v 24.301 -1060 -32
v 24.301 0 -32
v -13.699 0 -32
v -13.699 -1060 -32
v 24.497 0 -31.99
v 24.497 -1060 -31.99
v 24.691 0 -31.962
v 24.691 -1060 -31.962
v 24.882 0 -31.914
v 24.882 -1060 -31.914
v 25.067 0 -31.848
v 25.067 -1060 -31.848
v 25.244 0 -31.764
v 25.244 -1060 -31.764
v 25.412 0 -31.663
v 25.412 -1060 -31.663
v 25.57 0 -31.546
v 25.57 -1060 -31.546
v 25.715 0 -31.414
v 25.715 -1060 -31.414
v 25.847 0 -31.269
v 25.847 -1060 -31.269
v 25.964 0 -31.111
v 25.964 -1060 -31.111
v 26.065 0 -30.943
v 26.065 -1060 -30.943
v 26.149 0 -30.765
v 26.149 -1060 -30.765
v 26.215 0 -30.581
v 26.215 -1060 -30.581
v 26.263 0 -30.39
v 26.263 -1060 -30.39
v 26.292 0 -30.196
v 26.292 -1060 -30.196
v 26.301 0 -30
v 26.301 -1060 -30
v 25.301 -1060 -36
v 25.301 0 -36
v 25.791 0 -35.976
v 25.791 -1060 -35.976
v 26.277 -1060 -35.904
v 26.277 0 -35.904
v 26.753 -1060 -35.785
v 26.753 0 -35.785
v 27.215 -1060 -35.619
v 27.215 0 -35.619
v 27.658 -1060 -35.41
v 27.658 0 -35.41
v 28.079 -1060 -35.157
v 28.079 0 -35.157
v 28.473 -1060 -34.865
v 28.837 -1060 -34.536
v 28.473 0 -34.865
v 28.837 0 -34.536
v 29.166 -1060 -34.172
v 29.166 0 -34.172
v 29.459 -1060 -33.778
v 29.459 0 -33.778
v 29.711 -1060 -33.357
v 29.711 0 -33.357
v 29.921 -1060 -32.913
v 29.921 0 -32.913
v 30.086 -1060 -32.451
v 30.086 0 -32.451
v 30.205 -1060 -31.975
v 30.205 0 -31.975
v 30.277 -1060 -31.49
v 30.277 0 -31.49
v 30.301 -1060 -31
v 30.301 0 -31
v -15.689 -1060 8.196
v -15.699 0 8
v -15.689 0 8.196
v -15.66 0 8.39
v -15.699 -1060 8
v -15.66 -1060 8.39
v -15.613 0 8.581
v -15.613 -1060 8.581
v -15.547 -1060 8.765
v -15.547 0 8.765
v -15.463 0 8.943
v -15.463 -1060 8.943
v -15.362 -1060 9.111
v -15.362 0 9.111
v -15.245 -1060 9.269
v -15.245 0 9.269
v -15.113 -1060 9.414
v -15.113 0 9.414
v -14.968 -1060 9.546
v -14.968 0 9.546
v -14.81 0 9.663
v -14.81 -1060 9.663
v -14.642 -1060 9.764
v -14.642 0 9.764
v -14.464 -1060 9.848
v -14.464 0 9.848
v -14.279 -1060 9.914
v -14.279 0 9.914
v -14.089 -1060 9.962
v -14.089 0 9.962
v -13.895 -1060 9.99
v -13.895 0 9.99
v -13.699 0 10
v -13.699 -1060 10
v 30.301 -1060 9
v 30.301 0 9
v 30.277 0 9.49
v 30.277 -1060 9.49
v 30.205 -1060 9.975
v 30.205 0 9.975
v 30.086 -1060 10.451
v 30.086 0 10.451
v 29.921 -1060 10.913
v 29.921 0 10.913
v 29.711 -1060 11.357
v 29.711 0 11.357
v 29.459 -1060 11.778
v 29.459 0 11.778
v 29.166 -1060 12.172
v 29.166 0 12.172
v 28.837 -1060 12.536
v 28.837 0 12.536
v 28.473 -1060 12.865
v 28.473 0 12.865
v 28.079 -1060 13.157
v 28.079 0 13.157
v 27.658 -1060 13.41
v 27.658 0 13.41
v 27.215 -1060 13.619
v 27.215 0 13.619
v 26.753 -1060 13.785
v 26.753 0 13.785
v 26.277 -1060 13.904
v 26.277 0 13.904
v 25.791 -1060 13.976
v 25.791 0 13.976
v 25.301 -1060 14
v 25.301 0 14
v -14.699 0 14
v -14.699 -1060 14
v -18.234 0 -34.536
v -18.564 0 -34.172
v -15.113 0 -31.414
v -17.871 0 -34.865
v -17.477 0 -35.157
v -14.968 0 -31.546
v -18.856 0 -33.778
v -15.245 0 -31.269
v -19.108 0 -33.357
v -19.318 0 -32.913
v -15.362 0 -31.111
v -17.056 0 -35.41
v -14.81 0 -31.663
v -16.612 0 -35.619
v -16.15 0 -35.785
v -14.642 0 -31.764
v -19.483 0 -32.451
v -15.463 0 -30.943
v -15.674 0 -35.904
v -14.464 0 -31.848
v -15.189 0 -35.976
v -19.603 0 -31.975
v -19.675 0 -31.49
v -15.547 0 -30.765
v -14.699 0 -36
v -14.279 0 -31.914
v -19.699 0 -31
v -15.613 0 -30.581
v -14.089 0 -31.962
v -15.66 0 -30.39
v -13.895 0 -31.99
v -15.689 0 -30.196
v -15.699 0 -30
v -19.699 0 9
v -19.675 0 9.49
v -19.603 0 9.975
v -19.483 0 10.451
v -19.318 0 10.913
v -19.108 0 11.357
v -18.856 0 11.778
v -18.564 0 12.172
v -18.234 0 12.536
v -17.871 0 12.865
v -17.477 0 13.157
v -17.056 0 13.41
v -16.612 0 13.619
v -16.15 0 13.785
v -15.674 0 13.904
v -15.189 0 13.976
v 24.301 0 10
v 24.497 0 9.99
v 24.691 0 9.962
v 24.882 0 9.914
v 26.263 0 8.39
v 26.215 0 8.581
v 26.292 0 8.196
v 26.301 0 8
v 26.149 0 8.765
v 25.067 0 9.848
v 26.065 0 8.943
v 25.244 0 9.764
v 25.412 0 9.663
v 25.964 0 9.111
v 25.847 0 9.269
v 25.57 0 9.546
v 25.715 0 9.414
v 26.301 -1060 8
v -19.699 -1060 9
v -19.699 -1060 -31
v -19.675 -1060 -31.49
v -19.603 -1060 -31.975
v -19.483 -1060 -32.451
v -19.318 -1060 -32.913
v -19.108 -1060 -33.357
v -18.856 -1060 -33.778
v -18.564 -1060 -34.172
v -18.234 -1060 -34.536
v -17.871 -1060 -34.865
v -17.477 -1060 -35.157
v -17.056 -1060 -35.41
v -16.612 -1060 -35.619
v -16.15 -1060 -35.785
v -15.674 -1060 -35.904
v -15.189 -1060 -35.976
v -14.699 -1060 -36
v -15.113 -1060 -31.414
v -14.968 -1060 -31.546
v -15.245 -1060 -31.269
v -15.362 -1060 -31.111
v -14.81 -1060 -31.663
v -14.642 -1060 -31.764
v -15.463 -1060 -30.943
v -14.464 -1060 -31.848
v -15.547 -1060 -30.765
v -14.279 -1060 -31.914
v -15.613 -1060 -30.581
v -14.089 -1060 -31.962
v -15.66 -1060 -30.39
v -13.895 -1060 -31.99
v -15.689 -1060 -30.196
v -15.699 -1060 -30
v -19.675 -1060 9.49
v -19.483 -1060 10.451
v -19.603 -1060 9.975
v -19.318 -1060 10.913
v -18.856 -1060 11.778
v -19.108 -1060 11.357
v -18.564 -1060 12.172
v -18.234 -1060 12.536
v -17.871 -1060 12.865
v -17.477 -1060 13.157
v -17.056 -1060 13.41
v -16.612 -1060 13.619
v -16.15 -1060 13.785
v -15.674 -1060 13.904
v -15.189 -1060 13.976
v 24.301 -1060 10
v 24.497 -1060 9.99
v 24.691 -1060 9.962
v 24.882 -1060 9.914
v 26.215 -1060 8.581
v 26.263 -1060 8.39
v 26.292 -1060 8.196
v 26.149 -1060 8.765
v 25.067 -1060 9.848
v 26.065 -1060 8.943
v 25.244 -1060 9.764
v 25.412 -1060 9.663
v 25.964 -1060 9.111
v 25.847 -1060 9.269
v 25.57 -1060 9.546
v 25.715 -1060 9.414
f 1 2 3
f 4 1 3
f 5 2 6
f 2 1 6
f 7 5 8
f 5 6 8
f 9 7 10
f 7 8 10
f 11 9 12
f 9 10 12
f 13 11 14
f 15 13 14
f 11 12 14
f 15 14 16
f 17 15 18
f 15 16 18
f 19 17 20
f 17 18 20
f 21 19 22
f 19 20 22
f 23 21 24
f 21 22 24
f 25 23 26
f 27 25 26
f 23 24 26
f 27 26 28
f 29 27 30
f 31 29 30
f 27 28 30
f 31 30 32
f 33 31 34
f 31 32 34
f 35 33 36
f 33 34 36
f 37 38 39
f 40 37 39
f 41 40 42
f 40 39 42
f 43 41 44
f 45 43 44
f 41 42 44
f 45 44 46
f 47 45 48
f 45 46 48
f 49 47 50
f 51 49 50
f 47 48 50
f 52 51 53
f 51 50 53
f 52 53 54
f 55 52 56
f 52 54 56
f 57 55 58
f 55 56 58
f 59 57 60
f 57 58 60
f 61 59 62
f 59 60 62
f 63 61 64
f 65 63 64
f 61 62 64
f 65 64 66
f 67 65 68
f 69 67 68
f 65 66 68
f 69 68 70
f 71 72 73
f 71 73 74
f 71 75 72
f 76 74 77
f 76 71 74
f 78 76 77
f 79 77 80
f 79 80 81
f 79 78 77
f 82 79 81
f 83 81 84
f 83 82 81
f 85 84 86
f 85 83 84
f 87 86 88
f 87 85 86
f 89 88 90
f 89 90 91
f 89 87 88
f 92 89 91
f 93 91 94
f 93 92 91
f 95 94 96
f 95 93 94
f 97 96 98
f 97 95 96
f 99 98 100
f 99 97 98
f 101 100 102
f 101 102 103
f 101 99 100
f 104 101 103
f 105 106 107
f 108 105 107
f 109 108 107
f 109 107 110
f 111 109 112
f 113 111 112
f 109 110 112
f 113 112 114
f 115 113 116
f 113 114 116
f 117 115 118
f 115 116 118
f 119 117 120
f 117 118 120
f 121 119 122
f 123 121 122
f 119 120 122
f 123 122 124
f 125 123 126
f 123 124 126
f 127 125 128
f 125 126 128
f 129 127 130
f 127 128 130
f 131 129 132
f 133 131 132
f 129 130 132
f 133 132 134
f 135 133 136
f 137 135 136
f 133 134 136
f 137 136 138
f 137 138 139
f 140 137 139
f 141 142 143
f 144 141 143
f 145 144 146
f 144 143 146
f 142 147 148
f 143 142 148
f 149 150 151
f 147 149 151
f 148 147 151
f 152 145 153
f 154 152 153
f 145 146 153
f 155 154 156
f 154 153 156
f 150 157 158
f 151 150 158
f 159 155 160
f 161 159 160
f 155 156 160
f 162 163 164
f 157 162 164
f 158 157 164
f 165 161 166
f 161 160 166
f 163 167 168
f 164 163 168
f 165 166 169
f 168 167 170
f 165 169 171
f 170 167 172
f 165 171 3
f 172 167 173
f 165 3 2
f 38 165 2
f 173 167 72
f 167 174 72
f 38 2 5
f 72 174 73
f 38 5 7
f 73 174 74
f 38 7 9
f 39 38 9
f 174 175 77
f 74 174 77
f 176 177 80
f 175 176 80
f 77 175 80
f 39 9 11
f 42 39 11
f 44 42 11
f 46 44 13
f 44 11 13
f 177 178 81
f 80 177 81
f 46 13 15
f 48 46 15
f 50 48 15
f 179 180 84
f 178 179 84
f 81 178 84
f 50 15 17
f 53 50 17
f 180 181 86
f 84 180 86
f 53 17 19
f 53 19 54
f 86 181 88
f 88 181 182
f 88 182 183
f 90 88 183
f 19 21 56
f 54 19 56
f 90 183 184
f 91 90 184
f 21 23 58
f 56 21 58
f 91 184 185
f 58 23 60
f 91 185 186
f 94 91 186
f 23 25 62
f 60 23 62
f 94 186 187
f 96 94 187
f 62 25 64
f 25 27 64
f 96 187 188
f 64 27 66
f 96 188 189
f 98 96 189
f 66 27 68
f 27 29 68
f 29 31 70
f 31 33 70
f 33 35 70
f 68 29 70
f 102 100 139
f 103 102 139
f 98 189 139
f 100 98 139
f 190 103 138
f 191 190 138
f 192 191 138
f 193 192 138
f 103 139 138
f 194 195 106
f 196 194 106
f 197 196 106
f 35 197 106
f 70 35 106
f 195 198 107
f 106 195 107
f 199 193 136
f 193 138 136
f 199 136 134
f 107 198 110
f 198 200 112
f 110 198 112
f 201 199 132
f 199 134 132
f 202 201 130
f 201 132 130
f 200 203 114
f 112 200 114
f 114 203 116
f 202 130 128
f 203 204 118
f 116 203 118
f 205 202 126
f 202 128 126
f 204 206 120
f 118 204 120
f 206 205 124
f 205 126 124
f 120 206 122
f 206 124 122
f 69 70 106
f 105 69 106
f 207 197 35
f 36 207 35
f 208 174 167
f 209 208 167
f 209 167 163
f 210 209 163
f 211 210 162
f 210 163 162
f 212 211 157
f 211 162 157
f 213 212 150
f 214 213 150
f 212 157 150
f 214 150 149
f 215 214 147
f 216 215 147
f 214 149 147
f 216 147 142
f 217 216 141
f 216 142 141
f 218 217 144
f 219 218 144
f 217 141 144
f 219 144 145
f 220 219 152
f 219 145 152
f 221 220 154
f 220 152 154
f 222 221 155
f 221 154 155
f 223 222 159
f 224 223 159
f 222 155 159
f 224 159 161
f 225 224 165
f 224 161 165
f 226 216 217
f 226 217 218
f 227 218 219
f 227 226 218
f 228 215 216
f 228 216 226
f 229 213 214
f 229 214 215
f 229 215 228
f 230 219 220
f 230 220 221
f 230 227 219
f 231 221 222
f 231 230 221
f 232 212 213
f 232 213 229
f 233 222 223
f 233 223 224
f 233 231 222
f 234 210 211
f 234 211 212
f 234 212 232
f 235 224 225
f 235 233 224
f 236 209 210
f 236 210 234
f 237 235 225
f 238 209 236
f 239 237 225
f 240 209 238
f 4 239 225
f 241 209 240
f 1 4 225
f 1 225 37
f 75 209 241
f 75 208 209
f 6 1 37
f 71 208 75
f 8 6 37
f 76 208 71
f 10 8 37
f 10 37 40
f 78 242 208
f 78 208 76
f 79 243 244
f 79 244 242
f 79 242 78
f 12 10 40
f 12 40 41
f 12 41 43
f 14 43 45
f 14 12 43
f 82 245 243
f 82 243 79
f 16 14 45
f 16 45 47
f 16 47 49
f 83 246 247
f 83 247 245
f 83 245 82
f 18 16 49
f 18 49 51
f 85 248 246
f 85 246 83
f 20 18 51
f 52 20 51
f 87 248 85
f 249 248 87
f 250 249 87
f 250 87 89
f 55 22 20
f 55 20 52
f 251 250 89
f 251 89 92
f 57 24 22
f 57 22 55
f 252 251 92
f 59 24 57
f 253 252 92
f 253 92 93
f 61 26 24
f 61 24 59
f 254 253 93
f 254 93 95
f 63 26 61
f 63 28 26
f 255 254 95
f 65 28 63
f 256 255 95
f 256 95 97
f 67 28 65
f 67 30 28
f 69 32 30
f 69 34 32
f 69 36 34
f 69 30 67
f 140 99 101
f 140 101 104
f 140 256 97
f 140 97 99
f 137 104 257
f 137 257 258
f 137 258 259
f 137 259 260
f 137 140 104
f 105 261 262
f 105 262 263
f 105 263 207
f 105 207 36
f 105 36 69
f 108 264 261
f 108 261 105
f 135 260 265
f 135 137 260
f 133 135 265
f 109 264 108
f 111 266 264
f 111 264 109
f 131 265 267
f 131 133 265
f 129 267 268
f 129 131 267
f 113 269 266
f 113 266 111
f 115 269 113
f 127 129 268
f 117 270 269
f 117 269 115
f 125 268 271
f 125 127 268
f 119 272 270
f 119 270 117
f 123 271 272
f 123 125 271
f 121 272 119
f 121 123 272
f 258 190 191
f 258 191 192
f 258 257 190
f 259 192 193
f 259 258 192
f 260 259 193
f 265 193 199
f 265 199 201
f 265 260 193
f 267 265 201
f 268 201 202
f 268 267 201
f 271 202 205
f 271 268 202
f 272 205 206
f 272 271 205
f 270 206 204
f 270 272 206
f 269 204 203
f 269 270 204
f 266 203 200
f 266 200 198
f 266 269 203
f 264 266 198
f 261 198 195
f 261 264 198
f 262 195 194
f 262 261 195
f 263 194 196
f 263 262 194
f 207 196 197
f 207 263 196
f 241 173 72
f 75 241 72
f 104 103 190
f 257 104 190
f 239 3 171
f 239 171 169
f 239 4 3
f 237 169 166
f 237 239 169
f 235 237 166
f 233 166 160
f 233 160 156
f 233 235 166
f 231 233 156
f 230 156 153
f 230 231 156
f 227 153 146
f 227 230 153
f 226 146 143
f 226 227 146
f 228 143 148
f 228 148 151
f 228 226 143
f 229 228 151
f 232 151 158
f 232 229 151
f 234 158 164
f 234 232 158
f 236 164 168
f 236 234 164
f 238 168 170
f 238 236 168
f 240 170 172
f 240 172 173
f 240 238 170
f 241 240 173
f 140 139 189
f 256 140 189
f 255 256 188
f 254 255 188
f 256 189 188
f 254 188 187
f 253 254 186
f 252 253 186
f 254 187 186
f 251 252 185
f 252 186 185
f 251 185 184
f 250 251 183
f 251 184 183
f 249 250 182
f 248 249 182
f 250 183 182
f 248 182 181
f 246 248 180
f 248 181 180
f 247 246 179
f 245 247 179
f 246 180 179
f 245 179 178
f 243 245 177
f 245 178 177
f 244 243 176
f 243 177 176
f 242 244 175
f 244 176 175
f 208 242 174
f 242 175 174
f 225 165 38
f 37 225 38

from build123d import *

# Parameters (mm, degrees)
F1_DEPTH = 1060
F2_R     = 2


with BuildPart() as f1:
    # F0 (on Front) → F1 (new body)
    with BuildSketch(Plane.XZ):
        with BuildLine():
            Line((5.301232, 14.000001), (-14.698768, 14.000001))
            ThreePointArc((-14.698768, 14.000001), (-18.234301, 12.535535), (-19.698768, 9.000001))
            Line((-19.698768, 9.000001), (-19.698768, -30.999999))
            ThreePointArc((-19.698768, -30.999999), (-18.234301, -34.535533), (-14.698768, -35.999999))
            Line((-14.698768, -35.999999), (5.301232, -35.999999))
            Line((5.301232, -35.999999), (25.301232, -35.999999))
            ThreePointArc((25.301232, -35.999999), (28.836766, -34.535533), (30.301232, -30.999999))
            Line((30.301232, -30.999999), (30.301232, 9.000001))
            ThreePointArc((30.301232, 9.000001), (28.836766, 12.535535), (25.301232, 14.000001))
            Line((25.301232, 14.000001), (5.301232, 14.000001))
        make_face()
        Polygon((-15.698768, -31.999999), (-15.698768, 10.000001), (5.301232, 10.000001), (26.301232, 10.000001), (26.301232, -31.999999), (5.301232, -31.999999), align=None, mode=Mode.SUBTRACT)
    extrude(amount=F1_DEPTH)

    # F2
    f2_edges = [f1.edges().sort_by_distance(p)[0] for p in [
        (-15.698768, -530, 10.000001),
        (26.301232, -530, 10.000001),
        (26.301232, -530, -31.999999),
        (-15.698768, -530, -31.999999),
    ]]
    fillet(f2_edges, radius=F2_R)


solid = f1.part
